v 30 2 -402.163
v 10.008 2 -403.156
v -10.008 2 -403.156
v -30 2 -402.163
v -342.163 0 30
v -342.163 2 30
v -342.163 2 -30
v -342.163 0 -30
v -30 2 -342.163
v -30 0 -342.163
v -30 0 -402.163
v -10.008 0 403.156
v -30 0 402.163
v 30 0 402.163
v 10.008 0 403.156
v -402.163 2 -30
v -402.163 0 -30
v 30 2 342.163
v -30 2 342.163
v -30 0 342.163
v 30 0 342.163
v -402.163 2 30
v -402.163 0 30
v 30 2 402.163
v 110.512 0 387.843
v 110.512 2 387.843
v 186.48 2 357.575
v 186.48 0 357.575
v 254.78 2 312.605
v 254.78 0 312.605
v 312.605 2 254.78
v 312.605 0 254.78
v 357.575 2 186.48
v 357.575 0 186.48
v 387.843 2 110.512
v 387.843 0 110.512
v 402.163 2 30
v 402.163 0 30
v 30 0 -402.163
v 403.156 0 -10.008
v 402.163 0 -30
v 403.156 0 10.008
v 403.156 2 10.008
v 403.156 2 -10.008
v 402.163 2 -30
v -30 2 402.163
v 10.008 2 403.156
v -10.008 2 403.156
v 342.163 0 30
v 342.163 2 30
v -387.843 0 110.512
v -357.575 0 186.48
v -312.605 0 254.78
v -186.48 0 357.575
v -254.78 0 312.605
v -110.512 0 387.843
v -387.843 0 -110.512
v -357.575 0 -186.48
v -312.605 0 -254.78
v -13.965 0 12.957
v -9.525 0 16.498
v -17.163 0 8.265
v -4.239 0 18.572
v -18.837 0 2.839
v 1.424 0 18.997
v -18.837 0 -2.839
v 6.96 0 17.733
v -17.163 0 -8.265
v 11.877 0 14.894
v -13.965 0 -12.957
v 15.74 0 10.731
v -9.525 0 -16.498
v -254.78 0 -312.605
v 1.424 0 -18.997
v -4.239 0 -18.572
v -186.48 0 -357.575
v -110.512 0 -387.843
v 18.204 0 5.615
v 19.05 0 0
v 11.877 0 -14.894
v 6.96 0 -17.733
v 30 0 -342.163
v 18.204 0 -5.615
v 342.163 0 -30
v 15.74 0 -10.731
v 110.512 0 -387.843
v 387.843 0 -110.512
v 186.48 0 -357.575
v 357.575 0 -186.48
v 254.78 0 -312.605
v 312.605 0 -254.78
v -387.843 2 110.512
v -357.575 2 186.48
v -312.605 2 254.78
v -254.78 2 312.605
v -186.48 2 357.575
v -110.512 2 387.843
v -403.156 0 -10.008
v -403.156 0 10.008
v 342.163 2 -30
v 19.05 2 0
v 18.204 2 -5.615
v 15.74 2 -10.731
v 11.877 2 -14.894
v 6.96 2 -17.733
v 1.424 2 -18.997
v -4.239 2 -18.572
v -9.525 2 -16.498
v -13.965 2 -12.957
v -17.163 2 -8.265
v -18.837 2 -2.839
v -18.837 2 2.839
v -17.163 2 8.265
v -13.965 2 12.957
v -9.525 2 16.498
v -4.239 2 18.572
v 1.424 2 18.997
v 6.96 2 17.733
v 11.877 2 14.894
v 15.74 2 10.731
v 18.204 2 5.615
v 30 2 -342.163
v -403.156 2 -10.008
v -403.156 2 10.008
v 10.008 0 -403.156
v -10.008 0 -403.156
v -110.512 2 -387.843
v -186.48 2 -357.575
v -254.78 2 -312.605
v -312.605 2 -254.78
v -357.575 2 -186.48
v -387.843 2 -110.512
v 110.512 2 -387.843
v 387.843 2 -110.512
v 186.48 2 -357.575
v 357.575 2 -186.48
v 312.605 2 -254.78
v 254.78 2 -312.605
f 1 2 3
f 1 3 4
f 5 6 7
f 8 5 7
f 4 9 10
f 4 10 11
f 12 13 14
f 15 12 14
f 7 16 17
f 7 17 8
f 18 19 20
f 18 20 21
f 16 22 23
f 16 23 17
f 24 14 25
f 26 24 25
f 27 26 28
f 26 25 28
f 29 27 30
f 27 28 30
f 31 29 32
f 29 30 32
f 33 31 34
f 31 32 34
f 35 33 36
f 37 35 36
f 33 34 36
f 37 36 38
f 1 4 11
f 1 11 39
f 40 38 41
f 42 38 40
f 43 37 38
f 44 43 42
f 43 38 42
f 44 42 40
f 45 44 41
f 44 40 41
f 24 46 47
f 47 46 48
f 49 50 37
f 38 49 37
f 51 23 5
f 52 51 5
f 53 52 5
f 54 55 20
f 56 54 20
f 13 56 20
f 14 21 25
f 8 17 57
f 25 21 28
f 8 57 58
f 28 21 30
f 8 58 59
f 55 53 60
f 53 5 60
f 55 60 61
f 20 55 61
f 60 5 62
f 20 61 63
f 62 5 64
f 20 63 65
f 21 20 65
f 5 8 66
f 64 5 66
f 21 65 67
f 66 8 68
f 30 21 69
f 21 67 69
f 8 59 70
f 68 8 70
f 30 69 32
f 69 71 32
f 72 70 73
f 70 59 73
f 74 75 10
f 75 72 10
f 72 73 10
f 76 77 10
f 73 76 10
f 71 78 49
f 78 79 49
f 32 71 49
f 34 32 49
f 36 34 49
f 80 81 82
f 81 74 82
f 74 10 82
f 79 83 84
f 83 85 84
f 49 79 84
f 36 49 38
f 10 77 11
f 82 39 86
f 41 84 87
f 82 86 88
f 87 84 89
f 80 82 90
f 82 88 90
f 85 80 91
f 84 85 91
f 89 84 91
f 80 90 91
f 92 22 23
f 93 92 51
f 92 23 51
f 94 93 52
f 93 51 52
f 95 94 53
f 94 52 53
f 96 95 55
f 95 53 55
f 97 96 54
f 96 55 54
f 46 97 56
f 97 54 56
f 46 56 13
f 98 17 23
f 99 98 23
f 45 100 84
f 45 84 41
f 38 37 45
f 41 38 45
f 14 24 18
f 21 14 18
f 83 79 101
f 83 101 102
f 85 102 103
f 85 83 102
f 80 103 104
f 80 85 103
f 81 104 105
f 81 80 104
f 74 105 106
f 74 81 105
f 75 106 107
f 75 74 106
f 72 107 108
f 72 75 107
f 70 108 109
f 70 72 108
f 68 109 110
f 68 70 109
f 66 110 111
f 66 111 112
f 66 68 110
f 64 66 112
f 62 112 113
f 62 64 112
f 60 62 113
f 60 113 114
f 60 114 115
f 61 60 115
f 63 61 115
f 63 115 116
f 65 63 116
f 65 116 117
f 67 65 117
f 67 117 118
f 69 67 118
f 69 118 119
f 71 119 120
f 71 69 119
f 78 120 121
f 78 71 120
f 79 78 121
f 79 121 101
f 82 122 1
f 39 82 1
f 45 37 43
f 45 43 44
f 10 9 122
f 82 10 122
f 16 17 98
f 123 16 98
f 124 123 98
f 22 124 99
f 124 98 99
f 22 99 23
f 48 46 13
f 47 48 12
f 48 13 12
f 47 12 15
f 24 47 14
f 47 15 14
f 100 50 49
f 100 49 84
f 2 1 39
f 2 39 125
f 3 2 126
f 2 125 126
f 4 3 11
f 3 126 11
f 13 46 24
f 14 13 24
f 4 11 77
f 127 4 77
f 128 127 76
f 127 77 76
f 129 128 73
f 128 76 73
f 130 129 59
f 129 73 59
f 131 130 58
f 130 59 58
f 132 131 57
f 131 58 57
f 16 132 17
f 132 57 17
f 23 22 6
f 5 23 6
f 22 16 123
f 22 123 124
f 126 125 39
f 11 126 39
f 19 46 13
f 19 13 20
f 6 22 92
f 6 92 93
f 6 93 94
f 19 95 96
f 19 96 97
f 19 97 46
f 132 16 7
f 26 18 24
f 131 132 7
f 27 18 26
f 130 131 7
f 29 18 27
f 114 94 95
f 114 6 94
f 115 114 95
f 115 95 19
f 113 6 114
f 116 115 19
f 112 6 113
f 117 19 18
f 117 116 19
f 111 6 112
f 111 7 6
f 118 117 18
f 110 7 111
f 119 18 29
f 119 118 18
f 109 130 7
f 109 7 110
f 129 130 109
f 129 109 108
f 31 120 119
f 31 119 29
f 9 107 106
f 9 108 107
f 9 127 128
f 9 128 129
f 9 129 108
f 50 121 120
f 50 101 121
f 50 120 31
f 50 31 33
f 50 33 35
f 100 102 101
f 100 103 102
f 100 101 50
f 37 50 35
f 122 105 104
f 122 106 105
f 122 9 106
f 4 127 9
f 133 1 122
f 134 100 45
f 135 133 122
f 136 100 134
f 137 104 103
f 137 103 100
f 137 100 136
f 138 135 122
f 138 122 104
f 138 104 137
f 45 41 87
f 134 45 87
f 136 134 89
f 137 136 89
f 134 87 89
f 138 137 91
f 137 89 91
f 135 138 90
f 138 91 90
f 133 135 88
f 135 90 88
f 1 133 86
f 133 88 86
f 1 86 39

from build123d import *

# Parameters (mm, degrees)
CROQUIS1_R              = 403.28
CROQUIS1_R_2            = 19.05
SALIENTE_EXTRUIR1_DEPTH = 2
CROQUIS3_W              = 60
CROQUIS3_H              = 60
CORTAR_EXTRUIR1_DEPTH   = 3


with BuildPart() as part:
    # Croquis1 → Saliente-Extruir1 (new body)
    with BuildSketch(Plane(origin=(0, 0, 0), x_dir=(1, 0, 0), z_dir=(0, 1, 0))):
        Circle(CROQUIS1_R)
        Circle(CROQUIS1_R_2, mode=Mode.SUBTRACT)
    extrude(amount=SALIENTE_EXTRUIR1_DEPTH)

    # Croquis3 → Cortar-Extruir1 (cut, through all)
    with BuildSketch(Plane(origin=(0, 2, 0), x_dir=(1, 0, 0), z_dir=(0, 1, 0))):
        with Locations((372.162601941, 0)):
            Rectangle(CROQUIS3_W, CROQUIS3_H)
        with Locations((0, -372.162601941)):
            Rectangle(CROQUIS3_W, CROQUIS3_H)
        with Locations((-372.162601941, 0)):
            Rectangle(CROQUIS3_W, CROQUIS3_H)
        with Locations((0, 372.162601941)):
            Rectangle(CROQUIS3_W, CROQUIS3_H)
    extrude(amount=-CORTAR_EXTRUIR1_DEPTH, mode=Mode.SUBTRACT)


solid = part.part
